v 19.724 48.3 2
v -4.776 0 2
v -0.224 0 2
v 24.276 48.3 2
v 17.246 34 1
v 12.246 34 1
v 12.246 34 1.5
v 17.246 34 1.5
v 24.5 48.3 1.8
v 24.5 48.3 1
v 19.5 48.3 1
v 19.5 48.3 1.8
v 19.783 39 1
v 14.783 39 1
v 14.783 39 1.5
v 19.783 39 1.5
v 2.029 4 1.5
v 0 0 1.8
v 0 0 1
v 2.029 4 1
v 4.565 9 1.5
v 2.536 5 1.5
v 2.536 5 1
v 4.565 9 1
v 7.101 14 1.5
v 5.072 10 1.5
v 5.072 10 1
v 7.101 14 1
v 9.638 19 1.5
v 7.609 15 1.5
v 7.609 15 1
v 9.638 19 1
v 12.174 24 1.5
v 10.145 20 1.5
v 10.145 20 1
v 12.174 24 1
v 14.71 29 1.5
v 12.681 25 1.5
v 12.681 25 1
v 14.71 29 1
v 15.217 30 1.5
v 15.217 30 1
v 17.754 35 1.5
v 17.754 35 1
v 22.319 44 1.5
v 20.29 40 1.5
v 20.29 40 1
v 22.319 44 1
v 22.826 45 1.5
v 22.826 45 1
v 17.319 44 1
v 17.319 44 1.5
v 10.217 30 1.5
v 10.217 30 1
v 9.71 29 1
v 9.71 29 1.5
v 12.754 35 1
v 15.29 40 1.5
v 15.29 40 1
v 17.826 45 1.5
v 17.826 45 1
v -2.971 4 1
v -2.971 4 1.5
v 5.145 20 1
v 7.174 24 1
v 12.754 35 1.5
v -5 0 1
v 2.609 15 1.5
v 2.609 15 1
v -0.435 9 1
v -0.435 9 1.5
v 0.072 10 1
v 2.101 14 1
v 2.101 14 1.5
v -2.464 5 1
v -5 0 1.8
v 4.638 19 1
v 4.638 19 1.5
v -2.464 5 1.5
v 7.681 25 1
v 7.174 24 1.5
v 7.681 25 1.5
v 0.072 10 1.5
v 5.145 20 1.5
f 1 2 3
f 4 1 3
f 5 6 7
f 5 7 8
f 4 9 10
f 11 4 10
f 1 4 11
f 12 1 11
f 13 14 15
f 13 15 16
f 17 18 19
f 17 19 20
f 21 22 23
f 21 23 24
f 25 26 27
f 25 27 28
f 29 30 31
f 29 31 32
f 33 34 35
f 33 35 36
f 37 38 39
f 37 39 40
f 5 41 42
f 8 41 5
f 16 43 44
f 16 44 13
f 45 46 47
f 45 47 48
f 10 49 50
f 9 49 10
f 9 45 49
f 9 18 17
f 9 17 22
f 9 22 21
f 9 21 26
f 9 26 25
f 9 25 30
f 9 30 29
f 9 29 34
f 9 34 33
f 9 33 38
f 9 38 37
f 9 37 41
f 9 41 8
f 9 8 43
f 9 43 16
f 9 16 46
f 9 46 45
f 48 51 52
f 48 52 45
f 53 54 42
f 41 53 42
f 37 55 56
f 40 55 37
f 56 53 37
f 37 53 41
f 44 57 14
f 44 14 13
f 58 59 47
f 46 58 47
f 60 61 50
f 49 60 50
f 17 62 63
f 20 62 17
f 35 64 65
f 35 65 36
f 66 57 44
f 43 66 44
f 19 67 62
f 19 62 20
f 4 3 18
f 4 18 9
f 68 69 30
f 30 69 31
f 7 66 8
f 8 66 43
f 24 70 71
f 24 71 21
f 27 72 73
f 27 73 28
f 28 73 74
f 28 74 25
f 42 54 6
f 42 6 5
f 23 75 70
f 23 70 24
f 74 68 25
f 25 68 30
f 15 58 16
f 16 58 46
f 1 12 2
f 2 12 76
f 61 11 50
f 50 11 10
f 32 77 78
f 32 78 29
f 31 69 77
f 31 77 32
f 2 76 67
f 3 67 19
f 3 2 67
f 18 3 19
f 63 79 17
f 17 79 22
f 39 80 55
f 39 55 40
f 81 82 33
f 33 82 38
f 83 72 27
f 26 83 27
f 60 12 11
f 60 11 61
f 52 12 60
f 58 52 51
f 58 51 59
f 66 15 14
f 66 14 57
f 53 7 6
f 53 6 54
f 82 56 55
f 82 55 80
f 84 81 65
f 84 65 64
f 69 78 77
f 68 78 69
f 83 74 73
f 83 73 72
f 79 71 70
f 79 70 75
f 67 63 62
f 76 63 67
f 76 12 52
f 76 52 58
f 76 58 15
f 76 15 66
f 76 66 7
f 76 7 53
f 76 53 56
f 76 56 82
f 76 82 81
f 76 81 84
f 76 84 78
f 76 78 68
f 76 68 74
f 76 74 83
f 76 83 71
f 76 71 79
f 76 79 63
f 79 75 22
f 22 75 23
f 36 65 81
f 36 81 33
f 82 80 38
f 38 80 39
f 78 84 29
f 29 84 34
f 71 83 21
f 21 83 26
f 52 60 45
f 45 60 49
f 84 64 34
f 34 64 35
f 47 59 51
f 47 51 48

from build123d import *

# Parameters (mm, degrees)
EXTRUDE_1_DEPTH     = 1
SKETCH_2_W          = 34.447182458
SKETCH_2_H          = 1
CUT_EXTRUDE_1_DEPTH = 0.5
CHAMFER_1_SIZE      = 0.2


with BuildPart() as part:
    # Эскиз1 → Бобышка-Вытянуть1 (new body)
    with BuildSketch(Plane.XY):
        Polygon((0, 0), (24.5, 48.3), (19.5, 48.3), (-5, 0), align=None)
    extrude(amount=EXTRUDE_1_DEPTH)

    # Эскиз2 → Вырез-Вытянуть1 (cut)
    with BuildSketch(Plane.XY.offset(1)):
        with Locations((13.095064359, 4.5)):
            Rectangle(SKETCH_2_W, SKETCH_2_H)
        with Locations((13.095064359, 9.5)):
            Rectangle(SKETCH_2_W, SKETCH_2_H)
        with Locations((13.095064359, 14.5)):
            Rectangle(SKETCH_2_W, SKETCH_2_H)
        with Locations((13.095064359, 19.5)):
            Rectangle(SKETCH_2_W, SKETCH_2_H)
        with Locations((13.095064359, 24.5)):
            Rectangle(SKETCH_2_W, SKETCH_2_H)
        with Locations((13.095064359, 29.5)):
            Rectangle(SKETCH_2_W, SKETCH_2_H)
        with Locations((13.095064359, 34.5)):
            Rectangle(SKETCH_2_W, SKETCH_2_H)
        with Locations((13.095064359, 39.5)):
            Rectangle(SKETCH_2_W, SKETCH_2_H)
        with Locations((13.095064359, 44.5)):
            Rectangle(SKETCH_2_W, SKETCH_2_H)
    extrude(amount=-CUT_EXTRUDE_1_DEPTH, mode=Mode.SUBTRACT)


with BuildPart() as body_2:
    # Зеркальное отражение1: mirrored copy
    add(part.part.mirror(Plane.XY.offset(1)))

    # Фаска1
    chamfer_1_edges = [body_2.edges().sort_by_distance(p)[0] for p in [
        (7.25, 24.15, 2),
        (12.25, 24.15, 2),
    ]]
    chamfer(chamfer_1_edges, length=CHAMFER_1_SIZE)


solid = body_2.part
